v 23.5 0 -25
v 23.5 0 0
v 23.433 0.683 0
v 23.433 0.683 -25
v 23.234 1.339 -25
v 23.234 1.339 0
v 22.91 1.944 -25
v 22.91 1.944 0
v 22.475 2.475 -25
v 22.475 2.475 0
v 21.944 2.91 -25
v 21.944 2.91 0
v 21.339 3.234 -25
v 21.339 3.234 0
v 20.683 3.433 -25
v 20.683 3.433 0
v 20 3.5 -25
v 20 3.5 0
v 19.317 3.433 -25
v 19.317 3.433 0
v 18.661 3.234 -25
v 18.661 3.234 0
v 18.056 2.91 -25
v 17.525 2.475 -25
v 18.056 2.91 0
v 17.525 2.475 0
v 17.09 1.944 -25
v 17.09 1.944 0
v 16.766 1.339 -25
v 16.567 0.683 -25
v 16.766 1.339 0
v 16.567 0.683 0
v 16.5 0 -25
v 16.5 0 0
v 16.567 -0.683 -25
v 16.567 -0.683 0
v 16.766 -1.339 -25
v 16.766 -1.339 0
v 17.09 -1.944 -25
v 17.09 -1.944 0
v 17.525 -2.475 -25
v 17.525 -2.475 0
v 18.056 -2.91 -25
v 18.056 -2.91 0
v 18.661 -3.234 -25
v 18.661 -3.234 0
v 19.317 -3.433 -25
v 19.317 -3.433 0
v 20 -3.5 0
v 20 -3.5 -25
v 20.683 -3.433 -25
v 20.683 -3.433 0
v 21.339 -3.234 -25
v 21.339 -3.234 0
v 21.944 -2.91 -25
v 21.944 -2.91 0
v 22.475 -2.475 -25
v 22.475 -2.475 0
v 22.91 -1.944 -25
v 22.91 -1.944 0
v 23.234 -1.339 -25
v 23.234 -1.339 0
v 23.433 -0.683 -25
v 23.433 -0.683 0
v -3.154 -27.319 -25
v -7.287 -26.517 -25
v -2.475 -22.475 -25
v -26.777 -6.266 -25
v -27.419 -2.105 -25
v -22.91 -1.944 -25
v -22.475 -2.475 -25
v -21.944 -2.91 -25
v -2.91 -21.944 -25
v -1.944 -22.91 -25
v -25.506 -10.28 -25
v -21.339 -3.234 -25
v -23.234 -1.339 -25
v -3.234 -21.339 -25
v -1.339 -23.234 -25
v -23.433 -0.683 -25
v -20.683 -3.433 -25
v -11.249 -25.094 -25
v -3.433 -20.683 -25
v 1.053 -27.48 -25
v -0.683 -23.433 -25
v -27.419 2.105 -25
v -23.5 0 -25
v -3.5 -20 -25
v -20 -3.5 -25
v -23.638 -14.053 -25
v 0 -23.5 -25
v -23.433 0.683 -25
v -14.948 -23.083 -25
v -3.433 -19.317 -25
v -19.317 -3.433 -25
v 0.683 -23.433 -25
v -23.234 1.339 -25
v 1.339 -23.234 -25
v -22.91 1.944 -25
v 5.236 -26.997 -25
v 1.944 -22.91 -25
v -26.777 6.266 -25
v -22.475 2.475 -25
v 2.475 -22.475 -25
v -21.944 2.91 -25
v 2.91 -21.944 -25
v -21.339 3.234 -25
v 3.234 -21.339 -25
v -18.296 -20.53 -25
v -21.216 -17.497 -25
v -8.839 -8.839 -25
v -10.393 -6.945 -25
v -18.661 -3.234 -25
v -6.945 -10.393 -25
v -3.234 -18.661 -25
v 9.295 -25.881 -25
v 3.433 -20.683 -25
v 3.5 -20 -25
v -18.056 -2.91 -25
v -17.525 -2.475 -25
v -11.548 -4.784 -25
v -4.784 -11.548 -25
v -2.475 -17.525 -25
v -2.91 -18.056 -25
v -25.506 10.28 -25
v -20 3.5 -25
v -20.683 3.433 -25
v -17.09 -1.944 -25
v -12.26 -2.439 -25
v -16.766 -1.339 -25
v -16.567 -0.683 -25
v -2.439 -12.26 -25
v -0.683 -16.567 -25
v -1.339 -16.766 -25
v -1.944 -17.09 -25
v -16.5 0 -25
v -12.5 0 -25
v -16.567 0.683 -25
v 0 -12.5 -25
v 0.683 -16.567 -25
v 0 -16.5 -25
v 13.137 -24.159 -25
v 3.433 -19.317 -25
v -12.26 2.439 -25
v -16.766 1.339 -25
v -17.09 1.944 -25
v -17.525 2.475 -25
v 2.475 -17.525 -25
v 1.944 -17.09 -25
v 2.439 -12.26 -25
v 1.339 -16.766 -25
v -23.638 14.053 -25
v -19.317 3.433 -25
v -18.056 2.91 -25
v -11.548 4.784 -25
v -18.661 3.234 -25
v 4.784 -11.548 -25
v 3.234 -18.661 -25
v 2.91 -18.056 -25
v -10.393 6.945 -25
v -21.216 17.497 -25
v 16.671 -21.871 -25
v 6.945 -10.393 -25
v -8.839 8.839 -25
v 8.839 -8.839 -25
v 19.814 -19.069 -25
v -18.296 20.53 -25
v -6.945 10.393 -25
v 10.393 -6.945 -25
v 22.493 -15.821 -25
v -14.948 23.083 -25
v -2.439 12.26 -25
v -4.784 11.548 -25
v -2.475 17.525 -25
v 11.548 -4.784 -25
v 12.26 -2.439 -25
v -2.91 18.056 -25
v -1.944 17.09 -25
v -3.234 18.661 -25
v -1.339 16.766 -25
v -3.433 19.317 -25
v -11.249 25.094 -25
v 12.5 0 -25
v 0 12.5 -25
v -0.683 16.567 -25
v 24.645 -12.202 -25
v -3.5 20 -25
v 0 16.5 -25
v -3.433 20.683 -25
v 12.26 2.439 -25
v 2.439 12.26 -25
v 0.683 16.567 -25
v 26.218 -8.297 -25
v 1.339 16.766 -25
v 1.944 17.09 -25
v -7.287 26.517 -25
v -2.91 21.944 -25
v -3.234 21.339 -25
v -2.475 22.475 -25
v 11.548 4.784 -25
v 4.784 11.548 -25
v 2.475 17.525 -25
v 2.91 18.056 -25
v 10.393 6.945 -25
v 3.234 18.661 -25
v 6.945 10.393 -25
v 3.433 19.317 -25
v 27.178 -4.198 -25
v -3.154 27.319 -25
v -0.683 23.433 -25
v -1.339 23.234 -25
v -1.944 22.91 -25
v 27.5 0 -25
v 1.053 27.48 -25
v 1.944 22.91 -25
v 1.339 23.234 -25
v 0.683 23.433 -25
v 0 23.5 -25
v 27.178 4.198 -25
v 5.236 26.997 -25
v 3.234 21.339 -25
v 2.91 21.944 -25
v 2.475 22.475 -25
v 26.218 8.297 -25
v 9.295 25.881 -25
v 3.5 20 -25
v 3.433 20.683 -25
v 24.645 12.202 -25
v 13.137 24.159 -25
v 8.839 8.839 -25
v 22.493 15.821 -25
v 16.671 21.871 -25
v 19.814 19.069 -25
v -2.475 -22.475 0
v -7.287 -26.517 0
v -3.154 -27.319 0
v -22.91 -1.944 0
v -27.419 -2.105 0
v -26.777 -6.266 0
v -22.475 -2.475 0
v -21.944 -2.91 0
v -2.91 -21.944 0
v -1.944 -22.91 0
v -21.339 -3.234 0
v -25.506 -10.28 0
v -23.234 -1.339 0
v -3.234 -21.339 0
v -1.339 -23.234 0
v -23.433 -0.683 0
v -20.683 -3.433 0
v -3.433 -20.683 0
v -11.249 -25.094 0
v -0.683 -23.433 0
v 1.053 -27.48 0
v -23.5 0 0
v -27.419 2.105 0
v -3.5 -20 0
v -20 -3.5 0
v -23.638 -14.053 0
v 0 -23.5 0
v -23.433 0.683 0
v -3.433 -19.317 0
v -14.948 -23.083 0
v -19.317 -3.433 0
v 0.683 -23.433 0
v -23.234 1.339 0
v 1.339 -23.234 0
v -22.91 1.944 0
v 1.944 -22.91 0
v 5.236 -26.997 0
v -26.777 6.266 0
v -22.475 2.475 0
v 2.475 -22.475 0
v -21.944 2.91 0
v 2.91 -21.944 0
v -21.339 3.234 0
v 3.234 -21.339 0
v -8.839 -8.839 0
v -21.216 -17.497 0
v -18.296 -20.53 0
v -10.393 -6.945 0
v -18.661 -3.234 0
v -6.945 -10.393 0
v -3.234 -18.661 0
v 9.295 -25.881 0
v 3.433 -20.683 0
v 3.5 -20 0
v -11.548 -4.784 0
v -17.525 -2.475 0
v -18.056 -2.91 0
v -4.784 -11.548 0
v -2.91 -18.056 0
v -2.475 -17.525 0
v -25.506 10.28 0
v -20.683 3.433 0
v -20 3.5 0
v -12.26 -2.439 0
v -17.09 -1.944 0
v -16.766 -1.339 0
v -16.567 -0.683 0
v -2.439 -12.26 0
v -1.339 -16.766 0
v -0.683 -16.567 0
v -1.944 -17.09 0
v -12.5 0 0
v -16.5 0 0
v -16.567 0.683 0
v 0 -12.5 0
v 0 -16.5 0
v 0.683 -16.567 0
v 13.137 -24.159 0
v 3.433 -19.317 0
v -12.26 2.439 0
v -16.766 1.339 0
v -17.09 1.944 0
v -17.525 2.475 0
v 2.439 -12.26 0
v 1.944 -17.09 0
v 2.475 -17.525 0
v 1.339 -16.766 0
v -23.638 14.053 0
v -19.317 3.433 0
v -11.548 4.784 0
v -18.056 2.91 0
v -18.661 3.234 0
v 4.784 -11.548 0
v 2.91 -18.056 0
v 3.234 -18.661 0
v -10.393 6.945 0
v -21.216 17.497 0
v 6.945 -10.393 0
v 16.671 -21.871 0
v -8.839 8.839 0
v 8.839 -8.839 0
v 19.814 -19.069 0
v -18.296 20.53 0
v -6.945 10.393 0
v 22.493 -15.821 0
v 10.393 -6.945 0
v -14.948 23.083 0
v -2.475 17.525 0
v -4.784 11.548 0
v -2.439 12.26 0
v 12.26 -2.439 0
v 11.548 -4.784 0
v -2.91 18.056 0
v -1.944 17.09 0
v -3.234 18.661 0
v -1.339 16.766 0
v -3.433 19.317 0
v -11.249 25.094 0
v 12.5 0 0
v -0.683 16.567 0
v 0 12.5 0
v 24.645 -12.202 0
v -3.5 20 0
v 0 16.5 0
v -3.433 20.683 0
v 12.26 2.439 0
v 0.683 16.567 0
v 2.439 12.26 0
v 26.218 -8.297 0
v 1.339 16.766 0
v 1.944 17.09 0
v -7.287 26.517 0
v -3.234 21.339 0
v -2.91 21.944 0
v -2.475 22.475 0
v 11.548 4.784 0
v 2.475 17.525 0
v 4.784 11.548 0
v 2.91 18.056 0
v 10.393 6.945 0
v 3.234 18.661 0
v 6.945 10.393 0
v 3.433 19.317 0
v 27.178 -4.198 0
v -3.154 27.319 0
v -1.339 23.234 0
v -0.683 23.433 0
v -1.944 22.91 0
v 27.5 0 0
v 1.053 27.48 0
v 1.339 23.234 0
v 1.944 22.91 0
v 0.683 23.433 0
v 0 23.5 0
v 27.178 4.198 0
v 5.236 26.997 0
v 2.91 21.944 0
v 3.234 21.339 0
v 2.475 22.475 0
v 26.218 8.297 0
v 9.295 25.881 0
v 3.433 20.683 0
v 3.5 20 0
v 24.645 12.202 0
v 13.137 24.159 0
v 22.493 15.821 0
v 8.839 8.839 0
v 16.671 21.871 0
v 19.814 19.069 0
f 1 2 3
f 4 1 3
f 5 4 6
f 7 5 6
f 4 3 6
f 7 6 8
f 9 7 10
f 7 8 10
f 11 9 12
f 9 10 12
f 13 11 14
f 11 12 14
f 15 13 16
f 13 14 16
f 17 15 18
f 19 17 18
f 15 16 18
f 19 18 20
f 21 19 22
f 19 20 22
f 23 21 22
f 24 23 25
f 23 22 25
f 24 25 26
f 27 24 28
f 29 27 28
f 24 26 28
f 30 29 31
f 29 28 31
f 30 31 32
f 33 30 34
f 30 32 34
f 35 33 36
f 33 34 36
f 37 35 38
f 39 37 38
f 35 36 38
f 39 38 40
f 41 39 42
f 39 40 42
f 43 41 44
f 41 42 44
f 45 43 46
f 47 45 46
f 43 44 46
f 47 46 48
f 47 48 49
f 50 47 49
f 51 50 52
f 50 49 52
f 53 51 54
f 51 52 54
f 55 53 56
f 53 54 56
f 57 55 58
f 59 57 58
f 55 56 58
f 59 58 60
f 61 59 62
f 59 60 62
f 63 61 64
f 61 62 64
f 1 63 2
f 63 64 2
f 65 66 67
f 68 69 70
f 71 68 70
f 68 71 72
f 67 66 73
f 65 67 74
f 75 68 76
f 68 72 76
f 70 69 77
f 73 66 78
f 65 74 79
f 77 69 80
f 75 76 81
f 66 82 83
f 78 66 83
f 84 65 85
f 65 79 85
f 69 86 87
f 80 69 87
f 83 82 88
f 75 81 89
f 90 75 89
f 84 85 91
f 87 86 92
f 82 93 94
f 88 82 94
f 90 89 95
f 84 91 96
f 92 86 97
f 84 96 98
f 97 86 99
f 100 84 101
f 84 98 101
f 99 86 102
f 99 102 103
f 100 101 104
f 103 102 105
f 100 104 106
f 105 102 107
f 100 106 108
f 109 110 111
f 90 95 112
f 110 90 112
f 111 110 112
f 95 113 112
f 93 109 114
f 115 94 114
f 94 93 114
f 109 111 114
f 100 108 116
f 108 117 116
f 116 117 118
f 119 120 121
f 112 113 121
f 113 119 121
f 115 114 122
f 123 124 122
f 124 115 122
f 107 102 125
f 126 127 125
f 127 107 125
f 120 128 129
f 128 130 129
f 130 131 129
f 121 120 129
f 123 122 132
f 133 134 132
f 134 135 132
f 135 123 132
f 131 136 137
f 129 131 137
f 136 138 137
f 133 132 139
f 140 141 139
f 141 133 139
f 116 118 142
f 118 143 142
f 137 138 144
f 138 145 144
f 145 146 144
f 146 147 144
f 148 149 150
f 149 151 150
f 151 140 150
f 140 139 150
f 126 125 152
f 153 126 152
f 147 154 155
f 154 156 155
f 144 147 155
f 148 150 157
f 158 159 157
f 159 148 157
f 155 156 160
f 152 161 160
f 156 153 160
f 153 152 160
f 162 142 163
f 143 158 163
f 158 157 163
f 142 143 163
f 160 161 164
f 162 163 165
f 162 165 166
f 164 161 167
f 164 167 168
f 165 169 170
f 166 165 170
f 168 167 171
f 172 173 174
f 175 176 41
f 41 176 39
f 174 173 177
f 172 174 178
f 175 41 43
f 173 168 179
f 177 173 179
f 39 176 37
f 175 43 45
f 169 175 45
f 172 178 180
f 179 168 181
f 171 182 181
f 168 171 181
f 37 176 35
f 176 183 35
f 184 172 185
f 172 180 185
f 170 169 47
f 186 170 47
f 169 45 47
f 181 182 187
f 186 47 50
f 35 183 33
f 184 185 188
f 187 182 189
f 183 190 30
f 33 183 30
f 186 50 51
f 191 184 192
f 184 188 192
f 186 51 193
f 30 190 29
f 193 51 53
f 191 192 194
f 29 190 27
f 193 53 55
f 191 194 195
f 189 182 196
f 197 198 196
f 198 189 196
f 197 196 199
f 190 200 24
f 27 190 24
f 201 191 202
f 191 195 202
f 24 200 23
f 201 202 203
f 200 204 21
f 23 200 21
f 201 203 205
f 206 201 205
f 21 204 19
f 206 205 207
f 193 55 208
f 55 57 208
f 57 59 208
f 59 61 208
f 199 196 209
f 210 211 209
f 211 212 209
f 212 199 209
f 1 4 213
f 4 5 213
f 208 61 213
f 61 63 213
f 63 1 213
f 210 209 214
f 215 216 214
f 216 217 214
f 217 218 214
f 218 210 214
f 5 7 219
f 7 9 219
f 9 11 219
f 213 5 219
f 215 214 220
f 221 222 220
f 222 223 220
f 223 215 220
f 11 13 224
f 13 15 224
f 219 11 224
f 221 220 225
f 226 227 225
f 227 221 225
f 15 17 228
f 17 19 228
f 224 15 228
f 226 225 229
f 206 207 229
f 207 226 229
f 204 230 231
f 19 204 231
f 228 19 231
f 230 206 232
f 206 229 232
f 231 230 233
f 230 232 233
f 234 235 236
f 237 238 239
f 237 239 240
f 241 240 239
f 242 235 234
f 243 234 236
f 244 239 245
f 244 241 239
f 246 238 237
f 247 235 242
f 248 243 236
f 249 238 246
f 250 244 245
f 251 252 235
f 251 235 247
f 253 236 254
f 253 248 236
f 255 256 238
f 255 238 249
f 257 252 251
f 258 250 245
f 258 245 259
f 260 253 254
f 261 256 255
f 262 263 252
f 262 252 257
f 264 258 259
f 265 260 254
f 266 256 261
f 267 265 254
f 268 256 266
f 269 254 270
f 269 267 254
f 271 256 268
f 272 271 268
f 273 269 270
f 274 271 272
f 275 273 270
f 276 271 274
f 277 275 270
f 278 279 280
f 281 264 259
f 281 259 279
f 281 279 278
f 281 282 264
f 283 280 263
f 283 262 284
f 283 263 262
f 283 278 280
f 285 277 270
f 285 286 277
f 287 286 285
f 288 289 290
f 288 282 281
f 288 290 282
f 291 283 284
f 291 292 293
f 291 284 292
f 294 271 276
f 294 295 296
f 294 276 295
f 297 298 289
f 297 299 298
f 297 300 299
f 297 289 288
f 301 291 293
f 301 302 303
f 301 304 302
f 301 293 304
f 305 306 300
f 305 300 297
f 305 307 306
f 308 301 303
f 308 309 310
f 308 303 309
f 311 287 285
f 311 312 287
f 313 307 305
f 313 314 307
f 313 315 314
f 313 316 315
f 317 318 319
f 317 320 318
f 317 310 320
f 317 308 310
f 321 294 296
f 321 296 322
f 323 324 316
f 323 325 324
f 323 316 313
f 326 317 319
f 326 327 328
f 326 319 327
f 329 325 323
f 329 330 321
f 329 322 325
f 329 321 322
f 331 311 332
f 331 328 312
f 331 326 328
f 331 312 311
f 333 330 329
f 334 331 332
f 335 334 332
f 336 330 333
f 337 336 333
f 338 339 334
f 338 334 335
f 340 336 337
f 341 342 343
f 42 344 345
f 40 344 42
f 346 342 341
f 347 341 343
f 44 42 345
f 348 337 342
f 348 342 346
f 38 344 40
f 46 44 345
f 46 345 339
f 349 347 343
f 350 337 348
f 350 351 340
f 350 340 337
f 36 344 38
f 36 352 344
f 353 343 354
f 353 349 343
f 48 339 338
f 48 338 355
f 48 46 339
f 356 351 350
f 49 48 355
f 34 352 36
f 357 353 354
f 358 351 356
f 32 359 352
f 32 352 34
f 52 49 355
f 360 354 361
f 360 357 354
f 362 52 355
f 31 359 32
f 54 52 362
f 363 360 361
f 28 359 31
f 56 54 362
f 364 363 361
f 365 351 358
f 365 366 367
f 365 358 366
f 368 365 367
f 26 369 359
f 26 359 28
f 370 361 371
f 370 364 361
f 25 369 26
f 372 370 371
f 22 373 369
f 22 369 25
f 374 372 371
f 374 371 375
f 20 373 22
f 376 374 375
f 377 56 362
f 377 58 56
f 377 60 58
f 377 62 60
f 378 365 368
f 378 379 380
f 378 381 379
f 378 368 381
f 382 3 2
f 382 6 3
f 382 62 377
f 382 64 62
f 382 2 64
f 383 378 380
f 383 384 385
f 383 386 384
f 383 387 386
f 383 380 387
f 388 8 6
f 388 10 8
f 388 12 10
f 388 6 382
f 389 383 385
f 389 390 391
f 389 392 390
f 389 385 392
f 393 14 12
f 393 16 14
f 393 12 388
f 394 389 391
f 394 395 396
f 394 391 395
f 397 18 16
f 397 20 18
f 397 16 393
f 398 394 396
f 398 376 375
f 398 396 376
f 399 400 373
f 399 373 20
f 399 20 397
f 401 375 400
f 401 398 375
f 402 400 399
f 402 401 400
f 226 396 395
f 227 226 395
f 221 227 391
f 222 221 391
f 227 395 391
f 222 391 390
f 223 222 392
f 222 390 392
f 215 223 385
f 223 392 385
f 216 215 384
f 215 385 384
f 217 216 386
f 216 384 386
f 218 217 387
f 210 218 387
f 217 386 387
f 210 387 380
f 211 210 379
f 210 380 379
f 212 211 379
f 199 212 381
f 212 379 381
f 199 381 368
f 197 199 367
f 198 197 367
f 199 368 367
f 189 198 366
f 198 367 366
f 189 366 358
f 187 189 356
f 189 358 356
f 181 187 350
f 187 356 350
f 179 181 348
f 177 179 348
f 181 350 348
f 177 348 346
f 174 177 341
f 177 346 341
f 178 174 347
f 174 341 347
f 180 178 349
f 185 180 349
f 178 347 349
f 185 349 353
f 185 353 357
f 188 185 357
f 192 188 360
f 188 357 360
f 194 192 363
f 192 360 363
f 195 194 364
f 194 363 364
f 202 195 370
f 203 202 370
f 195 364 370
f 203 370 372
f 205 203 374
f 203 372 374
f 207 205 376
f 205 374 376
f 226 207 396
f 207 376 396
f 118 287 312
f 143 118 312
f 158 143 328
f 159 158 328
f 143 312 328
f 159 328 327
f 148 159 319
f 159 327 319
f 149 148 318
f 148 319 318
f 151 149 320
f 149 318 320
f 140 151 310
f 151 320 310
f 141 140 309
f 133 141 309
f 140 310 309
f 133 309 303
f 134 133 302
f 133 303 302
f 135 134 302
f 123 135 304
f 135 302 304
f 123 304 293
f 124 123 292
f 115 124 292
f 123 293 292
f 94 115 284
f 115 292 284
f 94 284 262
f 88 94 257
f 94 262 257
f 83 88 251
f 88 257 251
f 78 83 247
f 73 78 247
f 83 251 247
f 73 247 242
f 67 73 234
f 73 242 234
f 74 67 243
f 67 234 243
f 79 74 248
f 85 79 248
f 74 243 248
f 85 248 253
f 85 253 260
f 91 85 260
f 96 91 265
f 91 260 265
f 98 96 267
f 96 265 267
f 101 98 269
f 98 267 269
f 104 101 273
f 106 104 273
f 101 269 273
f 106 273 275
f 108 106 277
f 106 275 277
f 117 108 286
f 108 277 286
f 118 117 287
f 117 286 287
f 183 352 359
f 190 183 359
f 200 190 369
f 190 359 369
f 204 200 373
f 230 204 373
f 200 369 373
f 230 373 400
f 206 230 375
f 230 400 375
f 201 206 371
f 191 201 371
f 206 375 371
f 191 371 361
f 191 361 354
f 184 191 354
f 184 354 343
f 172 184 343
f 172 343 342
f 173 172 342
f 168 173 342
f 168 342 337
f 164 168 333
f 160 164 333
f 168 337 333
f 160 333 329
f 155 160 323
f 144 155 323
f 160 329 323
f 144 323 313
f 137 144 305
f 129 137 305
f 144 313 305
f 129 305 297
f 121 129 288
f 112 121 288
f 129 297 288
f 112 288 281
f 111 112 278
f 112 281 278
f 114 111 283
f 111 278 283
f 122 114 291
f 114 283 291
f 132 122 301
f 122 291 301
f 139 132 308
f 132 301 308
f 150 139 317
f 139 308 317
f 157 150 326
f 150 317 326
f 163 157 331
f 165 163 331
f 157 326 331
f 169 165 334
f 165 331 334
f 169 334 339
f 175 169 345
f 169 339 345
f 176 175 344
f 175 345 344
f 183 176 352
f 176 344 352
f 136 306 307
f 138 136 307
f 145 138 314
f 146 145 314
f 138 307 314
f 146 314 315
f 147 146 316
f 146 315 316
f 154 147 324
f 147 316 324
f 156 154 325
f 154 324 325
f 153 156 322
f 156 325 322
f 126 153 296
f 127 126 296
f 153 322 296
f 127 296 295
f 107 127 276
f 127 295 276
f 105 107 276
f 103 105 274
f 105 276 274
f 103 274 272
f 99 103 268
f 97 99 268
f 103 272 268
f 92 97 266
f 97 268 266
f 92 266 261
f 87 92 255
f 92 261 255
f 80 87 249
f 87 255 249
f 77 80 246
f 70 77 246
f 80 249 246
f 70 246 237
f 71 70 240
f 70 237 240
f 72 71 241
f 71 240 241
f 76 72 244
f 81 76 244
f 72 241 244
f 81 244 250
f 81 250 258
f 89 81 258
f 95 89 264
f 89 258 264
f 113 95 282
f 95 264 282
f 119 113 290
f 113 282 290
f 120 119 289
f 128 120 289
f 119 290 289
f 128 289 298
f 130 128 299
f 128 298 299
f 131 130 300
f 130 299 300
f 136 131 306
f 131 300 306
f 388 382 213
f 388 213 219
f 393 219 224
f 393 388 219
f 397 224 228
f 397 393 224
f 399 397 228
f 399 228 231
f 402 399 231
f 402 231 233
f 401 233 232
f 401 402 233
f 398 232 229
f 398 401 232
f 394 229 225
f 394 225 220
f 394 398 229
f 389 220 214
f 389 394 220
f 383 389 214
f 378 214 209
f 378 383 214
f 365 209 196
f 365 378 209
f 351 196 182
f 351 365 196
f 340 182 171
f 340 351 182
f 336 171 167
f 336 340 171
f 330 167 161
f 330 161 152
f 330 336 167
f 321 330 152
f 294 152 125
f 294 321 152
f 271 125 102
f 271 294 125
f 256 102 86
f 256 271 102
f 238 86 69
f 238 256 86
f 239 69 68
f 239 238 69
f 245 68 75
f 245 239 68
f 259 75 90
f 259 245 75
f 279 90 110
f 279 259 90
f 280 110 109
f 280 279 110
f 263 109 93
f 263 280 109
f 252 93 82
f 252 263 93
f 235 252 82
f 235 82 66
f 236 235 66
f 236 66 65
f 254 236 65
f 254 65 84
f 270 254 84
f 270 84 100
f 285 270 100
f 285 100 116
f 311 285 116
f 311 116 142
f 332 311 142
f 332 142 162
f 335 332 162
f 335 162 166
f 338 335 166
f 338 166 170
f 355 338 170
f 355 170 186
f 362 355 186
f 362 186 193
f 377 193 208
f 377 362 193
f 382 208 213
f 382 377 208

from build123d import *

# Parameters (mm, degrees)
SKETCH_1_R          = 27.5
EXTRUDE_1_DEPTH     = 25
SKETCH_2_R          = 12.5
SKETCH_2_R_2        = 3.5
CUT_EXTRUDE_1_DEPTH = 25


with BuildPart() as part:
    # 草图1 → 凸台-拉伸1 (new body)
    with BuildSketch(Plane.XY):
        Circle(SKETCH_1_R)
    extrude(amount=-EXTRUDE_1_DEPTH)

    # 草图2 → 切除-拉伸1 (cut)
    with BuildSketch(Plane.XY):
        Circle(SKETCH_2_R)
        with Locations((20, 0)):
            Circle(SKETCH_2_R_2)
        with Locations((0, 20)):
            Circle(SKETCH_2_R_2)
        with Locations((-20, 0)):
            Circle(SKETCH_2_R_2)
        with Locations((0, -20)):
            Circle(SKETCH_2_R_2)
    extrude(amount=-CUT_EXTRUDE_1_DEPTH, mode=Mode.SUBTRACT)


solid = part.part
